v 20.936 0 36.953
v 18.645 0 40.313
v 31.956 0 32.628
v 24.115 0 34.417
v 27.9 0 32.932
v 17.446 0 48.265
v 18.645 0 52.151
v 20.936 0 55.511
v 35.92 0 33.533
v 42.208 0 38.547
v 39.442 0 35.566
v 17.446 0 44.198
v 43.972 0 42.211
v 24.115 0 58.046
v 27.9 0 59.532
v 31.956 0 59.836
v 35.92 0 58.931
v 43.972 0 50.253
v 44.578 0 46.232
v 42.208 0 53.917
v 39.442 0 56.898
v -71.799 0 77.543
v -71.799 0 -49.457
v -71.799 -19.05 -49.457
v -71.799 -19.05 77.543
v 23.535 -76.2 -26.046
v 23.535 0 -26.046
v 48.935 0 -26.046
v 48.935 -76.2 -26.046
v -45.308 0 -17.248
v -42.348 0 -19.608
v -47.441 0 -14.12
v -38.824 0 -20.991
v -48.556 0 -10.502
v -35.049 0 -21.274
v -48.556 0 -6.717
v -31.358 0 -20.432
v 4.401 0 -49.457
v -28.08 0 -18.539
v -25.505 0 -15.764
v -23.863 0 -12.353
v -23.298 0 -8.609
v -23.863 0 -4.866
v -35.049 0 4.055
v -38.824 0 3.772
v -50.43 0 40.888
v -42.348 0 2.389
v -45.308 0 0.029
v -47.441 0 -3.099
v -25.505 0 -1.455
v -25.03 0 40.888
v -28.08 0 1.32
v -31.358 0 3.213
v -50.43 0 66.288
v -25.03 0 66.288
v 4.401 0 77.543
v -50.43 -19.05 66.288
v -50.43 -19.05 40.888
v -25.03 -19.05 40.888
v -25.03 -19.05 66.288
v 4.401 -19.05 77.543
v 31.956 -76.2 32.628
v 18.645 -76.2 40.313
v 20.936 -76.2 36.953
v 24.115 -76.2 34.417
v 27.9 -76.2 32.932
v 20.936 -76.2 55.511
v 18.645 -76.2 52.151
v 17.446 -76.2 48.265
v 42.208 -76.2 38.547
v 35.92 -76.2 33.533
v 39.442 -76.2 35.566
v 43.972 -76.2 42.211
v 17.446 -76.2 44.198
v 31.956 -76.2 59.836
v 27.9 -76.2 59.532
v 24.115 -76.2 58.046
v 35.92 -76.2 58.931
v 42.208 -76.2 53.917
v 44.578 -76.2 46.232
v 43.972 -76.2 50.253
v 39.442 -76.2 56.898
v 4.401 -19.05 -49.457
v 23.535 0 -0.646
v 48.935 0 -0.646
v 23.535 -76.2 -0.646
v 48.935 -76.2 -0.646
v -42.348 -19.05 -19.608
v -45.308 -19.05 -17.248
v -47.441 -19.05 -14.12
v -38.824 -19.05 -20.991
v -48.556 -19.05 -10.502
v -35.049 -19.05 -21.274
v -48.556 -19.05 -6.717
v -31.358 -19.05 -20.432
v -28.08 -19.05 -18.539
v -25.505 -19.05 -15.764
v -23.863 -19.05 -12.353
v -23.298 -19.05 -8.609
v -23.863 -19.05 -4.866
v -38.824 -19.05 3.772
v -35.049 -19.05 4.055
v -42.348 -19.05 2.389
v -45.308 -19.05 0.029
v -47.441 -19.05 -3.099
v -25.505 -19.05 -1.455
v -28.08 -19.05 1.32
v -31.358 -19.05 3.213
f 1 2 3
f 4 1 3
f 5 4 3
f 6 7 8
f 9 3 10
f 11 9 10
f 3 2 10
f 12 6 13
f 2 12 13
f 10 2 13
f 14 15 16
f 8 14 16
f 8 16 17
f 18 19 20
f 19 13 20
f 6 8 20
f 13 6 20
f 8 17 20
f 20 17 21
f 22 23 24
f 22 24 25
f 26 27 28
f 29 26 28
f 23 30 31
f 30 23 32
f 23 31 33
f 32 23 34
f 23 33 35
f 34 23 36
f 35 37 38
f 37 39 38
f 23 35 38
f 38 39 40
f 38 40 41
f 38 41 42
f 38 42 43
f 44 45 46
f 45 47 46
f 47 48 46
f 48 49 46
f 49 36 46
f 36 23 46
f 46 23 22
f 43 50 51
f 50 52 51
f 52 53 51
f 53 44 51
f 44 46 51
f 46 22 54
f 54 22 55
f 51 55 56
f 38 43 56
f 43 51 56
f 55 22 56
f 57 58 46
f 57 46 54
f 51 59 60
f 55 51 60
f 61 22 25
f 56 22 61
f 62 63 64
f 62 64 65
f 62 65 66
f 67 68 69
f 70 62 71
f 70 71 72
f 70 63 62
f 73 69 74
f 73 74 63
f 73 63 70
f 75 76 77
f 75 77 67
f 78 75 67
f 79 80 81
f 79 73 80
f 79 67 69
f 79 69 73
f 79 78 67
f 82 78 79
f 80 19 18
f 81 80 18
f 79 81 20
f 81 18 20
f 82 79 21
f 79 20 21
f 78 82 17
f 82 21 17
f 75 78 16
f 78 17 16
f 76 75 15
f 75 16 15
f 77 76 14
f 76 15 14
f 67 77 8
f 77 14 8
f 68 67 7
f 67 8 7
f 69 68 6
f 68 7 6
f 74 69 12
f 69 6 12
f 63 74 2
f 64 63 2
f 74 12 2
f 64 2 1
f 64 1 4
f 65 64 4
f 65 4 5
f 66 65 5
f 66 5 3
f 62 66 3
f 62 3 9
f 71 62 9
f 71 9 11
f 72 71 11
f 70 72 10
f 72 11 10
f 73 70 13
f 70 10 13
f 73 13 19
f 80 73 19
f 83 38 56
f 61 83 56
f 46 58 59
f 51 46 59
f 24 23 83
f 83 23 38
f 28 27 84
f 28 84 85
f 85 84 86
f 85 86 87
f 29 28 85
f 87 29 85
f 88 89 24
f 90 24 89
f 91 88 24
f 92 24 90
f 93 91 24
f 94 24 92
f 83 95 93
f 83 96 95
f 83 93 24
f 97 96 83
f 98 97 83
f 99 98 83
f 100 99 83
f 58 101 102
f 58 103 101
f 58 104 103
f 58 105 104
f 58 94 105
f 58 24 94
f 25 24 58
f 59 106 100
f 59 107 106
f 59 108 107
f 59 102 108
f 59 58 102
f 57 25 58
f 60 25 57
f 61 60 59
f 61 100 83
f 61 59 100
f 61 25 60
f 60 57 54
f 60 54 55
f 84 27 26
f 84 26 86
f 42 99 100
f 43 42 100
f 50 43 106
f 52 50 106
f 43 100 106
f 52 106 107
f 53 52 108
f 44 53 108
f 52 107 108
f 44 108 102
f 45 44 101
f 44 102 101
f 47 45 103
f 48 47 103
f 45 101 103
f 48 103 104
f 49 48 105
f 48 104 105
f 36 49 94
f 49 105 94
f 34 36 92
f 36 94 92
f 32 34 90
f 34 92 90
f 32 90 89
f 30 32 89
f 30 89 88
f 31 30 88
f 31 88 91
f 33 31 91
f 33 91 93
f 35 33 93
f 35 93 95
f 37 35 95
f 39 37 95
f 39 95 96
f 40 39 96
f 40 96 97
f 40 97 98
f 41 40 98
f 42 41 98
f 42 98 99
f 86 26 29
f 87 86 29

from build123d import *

# Parameters (mm, degrees)
F0_W     = 76.2
F0_H     = 127
F1_DEPTH = 19.05
F2_W     = 25.4
F2_H     = 25.4
F3_DEPTH = 25.4
F4_R     = 12.7
F5_DEPTH = 25.4
F6_R     = 13.642157
F7_DEPTH = 76.2
F8_W     = 25.4
F8_H     = 25.4
F9_DEPTH = 76.2


with BuildPart() as f1:
    # F0 (on Front) → F1 (new body)
    with BuildSketch(Plane.XZ):
        with Locations((-33.69895, 14.042744)):
            Rectangle(F0_W, F0_H)
    extrude(amount=F1_DEPTH)

    # F2 (on face) → F3 (cut)
    with BuildSketch(Plane.XZ.offset(19.05)):
        with Locations((-37.730069, 53.588224)):
            Rectangle(F2_W, F2_H)
    extrude(amount=-F3_DEPTH, mode=Mode.SUBTRACT)

    # F4 (on face) → F5 (cut)
    with BuildSketch(Plane.XZ.offset(19.05)):
        with Locations((-35.998303, -8.60944)):
            Circle(F4_R)
    extrude(amount=-F5_DEPTH, mode=Mode.SUBTRACT)


with BuildPart() as f7:
    # F6 (on Front) → F7 (new body)
    with BuildSketch(Plane.XZ):
        with Locations((30.93604, 46.231721)):
            Circle(F6_R)
    extrude(amount=F7_DEPTH)


with BuildPart() as f9:
    # F8 (on Front) → F9 (new body)
    with BuildSketch(Plane.XZ):
        with Locations((36.23519, -13.346118)):
            Rectangle(F8_W, F8_H)
    extrude(amount=F9_DEPTH)


solid = Compound([f1.part, f7.part, f9.part])
